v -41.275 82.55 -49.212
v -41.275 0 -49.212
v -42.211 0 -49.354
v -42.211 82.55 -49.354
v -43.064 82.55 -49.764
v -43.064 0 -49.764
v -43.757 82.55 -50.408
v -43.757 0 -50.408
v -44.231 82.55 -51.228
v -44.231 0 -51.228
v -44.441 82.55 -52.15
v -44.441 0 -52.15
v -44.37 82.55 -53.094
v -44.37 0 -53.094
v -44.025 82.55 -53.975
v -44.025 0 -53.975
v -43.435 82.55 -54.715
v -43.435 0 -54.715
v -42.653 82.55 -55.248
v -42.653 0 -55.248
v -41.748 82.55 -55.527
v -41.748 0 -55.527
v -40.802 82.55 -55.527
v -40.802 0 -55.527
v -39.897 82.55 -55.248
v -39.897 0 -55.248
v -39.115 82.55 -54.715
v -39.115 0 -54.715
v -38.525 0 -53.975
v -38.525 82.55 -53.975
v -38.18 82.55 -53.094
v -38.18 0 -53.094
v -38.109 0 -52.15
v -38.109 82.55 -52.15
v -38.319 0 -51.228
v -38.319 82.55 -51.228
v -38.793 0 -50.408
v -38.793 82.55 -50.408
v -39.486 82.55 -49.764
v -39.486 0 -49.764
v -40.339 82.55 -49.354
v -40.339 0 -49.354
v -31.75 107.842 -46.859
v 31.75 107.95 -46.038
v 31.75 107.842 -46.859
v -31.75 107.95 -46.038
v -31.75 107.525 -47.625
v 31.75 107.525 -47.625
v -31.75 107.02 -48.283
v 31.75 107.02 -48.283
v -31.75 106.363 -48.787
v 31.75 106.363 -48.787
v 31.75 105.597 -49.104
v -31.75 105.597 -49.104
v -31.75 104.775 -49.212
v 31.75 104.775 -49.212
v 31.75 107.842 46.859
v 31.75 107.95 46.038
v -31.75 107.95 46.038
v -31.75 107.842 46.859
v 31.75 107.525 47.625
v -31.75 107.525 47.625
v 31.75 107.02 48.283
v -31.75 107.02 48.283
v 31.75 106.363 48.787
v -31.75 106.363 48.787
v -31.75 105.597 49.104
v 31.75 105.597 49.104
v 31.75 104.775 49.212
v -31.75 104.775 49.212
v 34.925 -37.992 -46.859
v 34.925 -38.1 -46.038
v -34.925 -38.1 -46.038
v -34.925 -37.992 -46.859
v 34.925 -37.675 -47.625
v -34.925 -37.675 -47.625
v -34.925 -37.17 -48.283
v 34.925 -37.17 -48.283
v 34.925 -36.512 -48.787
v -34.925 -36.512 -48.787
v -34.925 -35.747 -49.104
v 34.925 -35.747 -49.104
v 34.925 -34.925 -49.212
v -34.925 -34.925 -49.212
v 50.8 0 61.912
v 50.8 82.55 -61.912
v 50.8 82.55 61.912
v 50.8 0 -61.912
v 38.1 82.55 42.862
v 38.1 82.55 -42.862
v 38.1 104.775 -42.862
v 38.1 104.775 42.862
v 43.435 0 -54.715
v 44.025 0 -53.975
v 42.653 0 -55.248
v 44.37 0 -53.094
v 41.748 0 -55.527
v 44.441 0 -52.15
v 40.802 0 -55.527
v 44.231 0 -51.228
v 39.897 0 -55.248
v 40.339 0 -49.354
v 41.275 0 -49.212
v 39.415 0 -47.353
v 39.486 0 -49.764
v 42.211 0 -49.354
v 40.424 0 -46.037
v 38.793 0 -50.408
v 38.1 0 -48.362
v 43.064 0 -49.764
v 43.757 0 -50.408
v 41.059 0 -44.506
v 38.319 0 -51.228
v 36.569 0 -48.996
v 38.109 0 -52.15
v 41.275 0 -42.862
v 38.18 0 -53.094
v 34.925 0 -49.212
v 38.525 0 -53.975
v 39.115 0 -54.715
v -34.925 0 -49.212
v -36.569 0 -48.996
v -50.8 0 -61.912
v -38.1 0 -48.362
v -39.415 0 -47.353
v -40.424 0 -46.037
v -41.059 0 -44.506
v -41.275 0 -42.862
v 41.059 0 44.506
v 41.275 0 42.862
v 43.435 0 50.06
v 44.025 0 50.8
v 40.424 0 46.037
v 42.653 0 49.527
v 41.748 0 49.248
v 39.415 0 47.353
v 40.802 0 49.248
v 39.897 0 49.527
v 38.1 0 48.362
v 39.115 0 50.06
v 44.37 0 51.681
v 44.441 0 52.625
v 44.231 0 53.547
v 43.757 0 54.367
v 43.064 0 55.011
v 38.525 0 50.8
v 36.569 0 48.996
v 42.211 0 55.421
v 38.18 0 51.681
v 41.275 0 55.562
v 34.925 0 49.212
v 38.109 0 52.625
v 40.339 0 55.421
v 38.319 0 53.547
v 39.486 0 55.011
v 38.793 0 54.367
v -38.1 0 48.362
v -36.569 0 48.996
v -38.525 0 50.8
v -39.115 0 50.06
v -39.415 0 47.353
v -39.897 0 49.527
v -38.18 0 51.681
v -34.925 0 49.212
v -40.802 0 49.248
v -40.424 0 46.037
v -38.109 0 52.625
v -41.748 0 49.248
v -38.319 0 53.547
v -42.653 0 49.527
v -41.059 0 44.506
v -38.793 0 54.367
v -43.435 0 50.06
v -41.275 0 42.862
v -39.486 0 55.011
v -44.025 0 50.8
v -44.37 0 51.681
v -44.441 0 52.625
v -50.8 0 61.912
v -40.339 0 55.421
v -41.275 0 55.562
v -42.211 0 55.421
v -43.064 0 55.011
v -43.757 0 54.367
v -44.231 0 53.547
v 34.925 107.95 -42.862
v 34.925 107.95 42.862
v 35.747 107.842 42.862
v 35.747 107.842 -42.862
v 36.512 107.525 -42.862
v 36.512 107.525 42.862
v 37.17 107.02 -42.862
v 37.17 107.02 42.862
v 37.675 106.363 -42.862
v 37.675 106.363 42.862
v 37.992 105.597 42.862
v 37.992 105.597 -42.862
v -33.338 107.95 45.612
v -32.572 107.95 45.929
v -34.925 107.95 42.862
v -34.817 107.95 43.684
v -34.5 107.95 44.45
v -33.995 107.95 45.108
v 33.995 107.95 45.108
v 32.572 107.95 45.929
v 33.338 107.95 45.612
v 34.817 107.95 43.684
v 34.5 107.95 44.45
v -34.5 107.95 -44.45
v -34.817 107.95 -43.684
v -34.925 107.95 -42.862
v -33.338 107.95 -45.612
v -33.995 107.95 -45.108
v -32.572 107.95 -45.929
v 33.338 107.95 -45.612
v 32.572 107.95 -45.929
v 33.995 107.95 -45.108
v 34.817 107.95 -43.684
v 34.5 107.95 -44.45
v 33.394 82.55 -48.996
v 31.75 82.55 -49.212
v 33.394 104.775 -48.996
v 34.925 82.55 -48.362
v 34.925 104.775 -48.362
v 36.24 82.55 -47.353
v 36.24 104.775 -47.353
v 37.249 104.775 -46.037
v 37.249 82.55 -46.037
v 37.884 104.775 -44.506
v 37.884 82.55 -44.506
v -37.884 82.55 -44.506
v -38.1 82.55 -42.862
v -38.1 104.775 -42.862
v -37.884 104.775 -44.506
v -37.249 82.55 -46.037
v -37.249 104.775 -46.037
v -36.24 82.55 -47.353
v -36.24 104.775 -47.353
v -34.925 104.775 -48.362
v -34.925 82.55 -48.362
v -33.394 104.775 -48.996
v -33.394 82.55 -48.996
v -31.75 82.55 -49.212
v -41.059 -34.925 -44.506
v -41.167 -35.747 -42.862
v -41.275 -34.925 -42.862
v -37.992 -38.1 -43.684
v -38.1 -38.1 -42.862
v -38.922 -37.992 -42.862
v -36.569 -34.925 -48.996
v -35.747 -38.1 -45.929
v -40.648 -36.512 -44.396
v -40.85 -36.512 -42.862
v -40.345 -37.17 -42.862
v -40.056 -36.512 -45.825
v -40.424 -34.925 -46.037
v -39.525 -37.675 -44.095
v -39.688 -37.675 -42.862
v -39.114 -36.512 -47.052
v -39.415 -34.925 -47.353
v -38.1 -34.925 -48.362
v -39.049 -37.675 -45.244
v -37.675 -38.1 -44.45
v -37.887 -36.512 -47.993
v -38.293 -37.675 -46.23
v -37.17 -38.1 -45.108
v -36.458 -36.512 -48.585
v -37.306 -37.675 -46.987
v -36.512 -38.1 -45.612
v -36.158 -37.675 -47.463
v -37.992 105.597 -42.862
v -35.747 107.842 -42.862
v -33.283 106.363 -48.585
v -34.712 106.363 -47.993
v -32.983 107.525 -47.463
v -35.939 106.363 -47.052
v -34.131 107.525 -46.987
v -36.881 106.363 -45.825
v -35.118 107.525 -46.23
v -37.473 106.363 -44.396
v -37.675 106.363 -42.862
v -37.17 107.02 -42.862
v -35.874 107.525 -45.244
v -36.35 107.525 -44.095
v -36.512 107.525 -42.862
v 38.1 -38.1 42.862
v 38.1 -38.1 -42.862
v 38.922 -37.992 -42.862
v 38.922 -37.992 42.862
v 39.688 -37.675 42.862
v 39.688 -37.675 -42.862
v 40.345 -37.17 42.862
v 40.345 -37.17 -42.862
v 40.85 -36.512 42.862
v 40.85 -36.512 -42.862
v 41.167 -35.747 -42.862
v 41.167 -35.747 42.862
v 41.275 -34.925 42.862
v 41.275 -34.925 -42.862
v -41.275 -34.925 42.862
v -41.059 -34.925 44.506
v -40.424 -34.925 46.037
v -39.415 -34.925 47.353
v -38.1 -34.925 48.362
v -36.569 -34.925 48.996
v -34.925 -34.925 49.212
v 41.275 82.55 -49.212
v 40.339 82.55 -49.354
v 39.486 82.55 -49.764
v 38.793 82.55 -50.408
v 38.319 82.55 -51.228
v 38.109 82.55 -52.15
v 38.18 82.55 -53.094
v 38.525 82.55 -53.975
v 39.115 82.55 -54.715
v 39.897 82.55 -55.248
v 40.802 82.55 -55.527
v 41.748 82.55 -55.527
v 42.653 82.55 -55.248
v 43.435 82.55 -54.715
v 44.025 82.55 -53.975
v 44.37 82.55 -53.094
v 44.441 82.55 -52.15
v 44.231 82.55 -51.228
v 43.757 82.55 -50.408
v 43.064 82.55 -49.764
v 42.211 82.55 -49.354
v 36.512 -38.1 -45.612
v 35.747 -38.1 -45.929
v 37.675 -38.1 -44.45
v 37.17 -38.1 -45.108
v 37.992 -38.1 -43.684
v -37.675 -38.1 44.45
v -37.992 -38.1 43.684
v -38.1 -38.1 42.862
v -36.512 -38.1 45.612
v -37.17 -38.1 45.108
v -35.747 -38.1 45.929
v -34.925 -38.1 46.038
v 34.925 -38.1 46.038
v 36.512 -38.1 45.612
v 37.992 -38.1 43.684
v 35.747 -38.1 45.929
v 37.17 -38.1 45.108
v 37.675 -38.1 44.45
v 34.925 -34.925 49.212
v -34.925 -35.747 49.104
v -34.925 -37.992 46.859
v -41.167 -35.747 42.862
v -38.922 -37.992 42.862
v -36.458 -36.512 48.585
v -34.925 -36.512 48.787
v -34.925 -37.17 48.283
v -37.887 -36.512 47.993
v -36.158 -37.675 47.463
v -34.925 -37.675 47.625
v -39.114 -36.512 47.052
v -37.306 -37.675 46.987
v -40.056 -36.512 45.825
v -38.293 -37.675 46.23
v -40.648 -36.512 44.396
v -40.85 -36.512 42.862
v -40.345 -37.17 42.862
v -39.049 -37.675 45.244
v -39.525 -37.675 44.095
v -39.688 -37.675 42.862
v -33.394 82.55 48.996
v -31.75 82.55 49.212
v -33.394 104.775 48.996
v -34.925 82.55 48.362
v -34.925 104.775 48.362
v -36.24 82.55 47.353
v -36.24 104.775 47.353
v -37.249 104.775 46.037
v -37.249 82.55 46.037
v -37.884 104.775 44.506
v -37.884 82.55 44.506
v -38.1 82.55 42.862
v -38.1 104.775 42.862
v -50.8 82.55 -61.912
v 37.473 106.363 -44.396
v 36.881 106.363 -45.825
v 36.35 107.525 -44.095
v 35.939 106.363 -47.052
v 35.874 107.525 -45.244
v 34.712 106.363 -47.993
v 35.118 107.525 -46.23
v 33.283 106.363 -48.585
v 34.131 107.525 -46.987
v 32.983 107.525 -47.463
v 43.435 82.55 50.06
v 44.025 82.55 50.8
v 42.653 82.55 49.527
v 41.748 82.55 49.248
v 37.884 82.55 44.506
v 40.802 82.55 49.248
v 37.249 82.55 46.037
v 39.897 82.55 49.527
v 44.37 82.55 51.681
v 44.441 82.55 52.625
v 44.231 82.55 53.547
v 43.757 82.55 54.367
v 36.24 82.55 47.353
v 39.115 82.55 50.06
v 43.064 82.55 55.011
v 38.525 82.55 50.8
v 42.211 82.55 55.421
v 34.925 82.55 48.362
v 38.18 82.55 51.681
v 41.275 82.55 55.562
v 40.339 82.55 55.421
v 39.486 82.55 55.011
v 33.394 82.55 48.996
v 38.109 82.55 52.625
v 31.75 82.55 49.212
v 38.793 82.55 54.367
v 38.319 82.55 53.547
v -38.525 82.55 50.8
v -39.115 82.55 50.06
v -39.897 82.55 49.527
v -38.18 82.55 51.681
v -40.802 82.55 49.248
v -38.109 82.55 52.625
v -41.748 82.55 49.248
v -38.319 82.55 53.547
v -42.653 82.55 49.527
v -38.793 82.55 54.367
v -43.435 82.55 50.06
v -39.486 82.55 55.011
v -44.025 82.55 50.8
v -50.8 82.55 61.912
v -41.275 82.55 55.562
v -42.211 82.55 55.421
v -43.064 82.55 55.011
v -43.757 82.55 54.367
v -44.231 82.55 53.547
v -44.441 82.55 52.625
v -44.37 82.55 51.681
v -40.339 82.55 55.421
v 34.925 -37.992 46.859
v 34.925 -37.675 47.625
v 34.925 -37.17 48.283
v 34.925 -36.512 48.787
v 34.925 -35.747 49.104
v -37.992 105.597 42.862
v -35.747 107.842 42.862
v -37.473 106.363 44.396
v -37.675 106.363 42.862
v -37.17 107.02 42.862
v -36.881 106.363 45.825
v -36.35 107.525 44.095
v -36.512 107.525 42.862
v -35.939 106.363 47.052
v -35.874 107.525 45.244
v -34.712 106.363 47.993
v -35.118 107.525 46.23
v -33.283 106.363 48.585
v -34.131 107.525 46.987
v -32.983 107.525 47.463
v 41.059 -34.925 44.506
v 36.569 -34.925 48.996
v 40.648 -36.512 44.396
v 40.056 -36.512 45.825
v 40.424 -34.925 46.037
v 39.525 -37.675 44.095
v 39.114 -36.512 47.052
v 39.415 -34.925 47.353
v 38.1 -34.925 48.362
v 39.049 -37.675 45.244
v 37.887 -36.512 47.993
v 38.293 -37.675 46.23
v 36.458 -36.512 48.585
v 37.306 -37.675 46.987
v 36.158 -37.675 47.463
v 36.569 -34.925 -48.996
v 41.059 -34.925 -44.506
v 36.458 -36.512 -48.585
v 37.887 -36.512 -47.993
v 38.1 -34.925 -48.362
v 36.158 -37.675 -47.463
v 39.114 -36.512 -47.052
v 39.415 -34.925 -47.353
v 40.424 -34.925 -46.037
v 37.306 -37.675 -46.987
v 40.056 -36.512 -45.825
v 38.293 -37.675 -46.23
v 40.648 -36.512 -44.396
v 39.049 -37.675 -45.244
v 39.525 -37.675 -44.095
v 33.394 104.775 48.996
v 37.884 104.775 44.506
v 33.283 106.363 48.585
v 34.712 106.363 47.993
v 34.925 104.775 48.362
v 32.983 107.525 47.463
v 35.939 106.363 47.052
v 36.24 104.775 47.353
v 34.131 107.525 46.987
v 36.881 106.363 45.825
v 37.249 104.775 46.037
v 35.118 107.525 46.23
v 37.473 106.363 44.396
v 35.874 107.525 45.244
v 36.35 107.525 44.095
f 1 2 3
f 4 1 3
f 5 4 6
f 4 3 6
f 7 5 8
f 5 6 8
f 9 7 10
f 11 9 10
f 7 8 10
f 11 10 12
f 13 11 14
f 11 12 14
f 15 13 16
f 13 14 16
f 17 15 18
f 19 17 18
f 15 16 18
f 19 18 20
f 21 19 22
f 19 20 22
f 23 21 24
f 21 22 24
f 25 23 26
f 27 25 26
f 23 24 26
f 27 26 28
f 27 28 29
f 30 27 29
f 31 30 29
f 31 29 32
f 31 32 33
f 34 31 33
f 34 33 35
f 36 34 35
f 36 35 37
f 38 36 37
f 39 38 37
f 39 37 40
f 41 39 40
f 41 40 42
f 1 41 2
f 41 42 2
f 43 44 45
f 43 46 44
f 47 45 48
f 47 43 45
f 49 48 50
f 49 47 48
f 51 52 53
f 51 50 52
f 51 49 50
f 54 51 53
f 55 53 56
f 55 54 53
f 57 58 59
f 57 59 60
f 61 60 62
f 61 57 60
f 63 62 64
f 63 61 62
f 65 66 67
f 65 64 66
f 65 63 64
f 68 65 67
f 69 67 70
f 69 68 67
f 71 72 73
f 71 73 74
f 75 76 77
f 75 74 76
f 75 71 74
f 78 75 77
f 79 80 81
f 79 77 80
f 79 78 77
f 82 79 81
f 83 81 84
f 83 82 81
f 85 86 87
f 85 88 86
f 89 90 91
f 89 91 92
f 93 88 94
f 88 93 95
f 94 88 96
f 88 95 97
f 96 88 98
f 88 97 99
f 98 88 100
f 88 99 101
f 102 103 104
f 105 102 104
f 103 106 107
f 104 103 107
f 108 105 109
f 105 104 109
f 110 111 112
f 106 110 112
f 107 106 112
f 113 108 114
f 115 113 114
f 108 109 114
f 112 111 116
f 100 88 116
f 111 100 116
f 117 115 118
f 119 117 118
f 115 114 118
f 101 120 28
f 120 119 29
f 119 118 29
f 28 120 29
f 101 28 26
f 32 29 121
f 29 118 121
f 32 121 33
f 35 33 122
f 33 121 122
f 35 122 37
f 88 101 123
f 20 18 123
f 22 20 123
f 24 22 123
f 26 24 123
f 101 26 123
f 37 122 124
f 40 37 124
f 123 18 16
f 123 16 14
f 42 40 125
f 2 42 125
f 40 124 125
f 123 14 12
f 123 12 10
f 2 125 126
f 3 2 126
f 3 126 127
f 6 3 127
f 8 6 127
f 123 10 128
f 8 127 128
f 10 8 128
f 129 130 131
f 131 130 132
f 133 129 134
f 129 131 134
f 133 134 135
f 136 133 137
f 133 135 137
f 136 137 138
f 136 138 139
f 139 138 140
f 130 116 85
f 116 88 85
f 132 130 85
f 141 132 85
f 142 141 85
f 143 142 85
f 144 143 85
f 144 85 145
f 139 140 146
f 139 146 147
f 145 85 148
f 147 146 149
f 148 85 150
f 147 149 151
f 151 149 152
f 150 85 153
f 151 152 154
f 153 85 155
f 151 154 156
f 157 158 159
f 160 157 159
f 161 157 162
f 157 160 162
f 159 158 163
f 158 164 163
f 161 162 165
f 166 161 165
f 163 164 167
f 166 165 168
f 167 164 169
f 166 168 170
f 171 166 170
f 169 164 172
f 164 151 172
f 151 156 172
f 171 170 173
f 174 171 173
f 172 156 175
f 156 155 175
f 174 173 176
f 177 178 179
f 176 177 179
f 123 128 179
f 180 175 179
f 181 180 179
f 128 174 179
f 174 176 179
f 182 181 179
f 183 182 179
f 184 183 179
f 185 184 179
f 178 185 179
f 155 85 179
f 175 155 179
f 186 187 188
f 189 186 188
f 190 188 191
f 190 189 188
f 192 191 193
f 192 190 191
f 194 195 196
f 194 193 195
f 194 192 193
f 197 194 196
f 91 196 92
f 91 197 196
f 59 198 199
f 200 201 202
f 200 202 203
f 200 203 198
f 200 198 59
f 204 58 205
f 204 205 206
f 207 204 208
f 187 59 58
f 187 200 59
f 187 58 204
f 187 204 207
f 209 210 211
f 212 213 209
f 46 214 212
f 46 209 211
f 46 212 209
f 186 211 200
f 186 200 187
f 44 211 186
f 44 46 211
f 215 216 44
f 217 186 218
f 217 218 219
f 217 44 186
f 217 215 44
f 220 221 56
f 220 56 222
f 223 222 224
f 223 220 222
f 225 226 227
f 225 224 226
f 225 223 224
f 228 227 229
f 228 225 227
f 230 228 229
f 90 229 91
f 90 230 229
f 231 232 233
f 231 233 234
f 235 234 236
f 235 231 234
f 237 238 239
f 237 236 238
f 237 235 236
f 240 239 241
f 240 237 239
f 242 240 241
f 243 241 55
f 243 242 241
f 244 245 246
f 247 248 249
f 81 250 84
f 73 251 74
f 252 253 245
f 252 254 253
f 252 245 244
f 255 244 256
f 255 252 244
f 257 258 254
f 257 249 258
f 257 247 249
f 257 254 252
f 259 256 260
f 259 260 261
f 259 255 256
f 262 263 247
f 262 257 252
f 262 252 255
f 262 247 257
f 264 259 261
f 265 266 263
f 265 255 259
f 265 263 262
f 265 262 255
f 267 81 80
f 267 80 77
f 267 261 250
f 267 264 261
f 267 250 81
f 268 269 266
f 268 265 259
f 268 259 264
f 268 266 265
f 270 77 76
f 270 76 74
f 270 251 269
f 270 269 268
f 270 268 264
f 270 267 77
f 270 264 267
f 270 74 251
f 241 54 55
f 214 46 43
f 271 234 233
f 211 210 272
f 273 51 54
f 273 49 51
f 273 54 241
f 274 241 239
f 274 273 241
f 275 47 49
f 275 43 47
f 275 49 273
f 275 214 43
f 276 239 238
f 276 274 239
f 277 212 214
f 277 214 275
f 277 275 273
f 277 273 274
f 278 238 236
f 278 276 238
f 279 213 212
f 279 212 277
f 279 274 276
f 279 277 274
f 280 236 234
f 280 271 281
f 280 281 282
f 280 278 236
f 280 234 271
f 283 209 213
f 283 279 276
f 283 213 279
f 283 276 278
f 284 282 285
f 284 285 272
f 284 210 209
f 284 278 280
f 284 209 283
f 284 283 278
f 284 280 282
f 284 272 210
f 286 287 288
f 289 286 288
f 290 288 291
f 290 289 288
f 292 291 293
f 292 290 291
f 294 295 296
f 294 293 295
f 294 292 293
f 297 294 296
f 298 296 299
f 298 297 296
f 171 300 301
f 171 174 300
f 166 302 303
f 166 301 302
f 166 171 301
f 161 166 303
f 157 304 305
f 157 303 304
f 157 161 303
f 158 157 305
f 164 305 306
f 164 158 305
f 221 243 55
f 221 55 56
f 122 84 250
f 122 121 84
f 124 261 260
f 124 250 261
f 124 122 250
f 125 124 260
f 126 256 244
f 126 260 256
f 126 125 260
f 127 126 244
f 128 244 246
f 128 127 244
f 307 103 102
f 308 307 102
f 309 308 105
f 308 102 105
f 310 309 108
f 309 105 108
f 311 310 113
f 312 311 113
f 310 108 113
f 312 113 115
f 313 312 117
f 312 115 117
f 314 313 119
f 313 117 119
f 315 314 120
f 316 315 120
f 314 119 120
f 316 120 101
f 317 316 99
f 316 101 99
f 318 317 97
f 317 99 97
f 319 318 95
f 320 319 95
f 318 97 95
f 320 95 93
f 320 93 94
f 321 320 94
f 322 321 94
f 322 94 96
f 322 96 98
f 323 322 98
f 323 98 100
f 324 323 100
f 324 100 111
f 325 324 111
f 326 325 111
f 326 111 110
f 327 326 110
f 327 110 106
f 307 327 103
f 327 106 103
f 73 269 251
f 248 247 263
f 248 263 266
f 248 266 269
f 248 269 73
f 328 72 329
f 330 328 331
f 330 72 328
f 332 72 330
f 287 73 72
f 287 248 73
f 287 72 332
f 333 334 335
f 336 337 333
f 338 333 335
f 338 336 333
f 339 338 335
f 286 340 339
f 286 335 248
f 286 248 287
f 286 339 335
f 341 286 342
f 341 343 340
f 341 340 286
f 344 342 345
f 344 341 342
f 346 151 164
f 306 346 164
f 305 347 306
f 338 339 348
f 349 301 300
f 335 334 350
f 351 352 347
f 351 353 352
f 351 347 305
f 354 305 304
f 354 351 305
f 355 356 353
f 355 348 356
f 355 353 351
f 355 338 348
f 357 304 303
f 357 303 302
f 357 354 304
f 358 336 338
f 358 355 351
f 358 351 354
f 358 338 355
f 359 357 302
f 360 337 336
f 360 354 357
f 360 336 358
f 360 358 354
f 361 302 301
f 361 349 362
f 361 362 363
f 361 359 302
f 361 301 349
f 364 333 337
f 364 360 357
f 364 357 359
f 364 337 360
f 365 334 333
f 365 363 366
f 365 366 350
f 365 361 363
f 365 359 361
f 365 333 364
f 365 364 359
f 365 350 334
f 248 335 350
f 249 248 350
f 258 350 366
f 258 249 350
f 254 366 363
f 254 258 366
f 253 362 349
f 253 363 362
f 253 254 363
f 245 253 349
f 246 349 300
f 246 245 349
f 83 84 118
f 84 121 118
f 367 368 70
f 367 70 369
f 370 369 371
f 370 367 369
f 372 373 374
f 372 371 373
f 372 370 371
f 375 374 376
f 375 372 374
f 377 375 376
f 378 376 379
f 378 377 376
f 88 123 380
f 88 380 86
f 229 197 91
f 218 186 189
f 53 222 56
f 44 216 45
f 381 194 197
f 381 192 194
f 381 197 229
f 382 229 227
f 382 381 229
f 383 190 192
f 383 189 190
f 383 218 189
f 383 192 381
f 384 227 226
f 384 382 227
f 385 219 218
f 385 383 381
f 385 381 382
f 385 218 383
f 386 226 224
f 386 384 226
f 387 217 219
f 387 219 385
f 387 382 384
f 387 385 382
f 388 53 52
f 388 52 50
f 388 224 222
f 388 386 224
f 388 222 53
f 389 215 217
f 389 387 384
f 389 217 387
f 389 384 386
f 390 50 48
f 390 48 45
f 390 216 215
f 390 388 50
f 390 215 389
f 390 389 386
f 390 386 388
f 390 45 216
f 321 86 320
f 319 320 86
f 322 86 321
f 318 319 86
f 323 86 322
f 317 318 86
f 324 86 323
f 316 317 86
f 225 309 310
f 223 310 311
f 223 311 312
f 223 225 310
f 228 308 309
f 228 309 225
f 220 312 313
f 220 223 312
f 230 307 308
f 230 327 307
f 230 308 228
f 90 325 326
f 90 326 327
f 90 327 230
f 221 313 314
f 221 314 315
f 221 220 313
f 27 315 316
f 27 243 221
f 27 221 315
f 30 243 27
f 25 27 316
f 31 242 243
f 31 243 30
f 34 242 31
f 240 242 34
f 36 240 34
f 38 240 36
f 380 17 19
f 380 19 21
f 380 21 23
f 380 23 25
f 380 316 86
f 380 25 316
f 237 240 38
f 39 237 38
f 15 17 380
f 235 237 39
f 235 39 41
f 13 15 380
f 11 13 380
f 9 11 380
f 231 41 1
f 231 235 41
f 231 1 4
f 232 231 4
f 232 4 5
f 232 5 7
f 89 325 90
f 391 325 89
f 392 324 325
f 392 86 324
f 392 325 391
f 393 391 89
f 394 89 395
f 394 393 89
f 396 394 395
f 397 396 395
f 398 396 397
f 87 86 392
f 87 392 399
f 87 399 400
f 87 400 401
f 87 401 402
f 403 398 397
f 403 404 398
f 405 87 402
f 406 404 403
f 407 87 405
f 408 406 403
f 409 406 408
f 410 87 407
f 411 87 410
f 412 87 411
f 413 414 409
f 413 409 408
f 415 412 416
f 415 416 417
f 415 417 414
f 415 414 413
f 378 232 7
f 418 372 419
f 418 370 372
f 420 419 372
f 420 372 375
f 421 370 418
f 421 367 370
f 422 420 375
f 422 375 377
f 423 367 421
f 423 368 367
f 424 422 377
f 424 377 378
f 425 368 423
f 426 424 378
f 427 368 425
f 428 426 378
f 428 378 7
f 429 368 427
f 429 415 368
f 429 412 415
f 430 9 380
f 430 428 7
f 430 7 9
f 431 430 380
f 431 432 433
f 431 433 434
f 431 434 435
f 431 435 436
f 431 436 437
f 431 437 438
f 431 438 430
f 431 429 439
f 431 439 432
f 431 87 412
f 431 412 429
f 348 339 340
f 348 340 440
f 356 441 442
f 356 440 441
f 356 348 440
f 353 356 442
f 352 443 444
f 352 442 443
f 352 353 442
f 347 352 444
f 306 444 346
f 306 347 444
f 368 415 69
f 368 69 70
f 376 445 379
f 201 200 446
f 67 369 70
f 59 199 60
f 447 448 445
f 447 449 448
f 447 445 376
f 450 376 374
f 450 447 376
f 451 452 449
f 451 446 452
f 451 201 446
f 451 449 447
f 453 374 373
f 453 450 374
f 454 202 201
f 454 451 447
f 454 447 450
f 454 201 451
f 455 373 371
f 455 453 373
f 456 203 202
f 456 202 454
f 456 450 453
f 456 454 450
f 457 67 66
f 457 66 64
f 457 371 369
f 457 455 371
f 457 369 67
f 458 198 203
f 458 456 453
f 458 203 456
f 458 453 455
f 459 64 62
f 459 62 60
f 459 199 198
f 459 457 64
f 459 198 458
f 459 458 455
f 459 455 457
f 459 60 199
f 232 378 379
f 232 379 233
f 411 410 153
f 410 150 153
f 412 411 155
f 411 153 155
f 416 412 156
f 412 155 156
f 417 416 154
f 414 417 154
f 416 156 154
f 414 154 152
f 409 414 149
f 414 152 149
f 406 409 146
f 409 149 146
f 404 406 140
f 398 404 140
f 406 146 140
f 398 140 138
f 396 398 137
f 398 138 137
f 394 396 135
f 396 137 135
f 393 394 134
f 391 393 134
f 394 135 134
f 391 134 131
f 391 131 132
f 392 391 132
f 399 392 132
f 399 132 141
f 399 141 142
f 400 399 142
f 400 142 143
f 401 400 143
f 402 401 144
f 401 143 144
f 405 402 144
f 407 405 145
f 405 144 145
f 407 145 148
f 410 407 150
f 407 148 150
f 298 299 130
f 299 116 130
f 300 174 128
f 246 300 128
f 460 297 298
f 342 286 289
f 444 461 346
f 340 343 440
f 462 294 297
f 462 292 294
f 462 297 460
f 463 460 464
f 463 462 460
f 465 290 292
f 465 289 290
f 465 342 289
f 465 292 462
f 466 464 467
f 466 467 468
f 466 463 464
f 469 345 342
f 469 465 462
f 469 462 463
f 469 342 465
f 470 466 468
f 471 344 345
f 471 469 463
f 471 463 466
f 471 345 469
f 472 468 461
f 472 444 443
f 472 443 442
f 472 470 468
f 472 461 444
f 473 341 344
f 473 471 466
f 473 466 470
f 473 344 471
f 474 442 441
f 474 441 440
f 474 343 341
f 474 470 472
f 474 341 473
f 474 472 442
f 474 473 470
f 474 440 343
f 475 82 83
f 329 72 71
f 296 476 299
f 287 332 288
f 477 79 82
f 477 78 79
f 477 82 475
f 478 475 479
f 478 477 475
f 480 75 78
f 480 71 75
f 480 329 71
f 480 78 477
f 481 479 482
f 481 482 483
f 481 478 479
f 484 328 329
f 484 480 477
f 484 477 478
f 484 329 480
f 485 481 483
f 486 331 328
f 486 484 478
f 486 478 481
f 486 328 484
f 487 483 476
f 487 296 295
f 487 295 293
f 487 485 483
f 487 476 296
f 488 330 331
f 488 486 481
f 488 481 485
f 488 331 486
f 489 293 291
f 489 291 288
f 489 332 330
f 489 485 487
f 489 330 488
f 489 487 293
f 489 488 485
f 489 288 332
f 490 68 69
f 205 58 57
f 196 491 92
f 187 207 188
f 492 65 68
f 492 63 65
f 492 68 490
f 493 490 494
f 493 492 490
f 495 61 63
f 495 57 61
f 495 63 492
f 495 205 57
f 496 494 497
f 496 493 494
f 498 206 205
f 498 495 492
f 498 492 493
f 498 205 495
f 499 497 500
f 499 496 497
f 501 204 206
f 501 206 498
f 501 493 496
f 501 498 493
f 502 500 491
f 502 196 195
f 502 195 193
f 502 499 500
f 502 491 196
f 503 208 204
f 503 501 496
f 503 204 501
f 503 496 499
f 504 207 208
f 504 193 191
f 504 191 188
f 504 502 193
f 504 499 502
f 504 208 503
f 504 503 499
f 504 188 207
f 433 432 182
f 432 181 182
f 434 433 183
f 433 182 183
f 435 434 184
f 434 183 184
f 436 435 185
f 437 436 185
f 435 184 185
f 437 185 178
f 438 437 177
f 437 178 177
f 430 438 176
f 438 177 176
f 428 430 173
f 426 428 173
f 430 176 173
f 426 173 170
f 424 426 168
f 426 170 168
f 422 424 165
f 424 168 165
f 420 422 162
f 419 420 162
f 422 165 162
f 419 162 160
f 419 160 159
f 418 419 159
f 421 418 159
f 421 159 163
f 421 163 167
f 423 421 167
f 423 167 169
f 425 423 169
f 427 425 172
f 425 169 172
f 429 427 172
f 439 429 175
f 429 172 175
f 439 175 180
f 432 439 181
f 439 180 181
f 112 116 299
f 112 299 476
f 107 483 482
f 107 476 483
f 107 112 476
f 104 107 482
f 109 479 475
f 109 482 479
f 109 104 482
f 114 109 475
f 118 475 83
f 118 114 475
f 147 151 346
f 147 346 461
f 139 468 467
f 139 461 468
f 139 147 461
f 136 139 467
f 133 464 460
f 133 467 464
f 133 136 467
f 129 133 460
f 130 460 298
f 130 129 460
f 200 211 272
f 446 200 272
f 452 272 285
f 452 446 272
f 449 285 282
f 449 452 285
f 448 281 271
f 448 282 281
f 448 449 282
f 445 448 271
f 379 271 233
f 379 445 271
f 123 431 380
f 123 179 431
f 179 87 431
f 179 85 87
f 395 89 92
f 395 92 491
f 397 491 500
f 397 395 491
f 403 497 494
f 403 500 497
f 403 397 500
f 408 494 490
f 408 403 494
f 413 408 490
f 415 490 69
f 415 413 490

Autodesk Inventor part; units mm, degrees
ref_plane "YZ Plane" through (0, 0, 0) normal (1, 0, 0) x (0, 1, 0)
ref_plane "XZ Plane" through (0, 0, 0) normal (0, 1, 0) x (-1, 0, 0)
ref_plane "XY Plane" through (0, 0, 0) normal (0, 0, 1) x (1, 0, 0)
sketch "Sketch1" plane through (0, 0, 0) normal (0, 1, 0) x (-1, 0, 0)
  line L0 (-50.8, 61.9125) -> (50.8, 61.9125)
  line L1 (50.8, 61.9125) -> (50.8, -61.9125)
  line L2 (50.8, -61.9125) -> (-50.8, -61.9125)
  line L3 (-50.8, -61.9125) -> (-50.8, 61.9125)
  line L4 (-50.8, 61.9125) -> (50.8, -61.9125) construction
  line L5 (50.8, 61.9125) -> (-50.8, -61.9125) construction
  point P0 (0, 0)
  dimension "d0" = 123.825
  dimension "d1" = 101.6
extrude "Extrusion1" add sketch "Sketch1" along normal blind 82.55
sketch "Sketch2" plane through (0, 82.55, 0) normal (0, 1, 0) x (1, 0, 0)
  line L0 (31.75, -49.2125) -> (-31.75, -49.2125)
  line L1 (-38.1, -42.8625) -> (-38.1, 42.8625)
  line L2 (-31.75, 49.2125) -> (31.75, 49.2125)
  line L3 (38.1, 42.8625) -> (38.1, -42.8625)
  line L4 (38.1, -49.2125) -> (-38.1, 49.2125) construction
  line L5 (-38.1, -49.2125) -> (38.1, 49.2125) construction
  arc A0 (-38.1, -42.8625) -> (-31.75, -49.2125) centre (-31.75, -42.8625) ccw
  arc A1 (-31.75, 49.2125) -> (-38.1, 42.8625) centre (-31.75, 42.8625) ccw
  arc A2 (38.1, 42.8625) -> (31.75, 49.2125) centre (31.75, 42.8625) ccw
  arc A3 (31.75, -49.2125) -> (38.1, -42.8625) centre (31.75, -42.8625) ccw
  line L6 (-50.8, 61.9125) -> (-50.8, -61.9125) projected
  line L7 (50.8, 61.9125) -> (-50.8, 61.9125) projected
  point P0 (0, 0)
  dimension "d6" = 6.35
  dimension "d25" = 12.7
  dimension "d26" = 12.7
extrude "Extrusion2" add sketch "Sketch2" along normal blind 25.4
fillet "Fillet1" radius 3.175 8 edges at (36.2401, 107.95, 47.3526) (38.1, 107.95, 0) (36.2401, 107.95, -47.3526) (0, 107.95, -49.2125) (-36.2401, 107.95, -47.3526) (-38.1, 107.95, 0) (-36.2401, 107.95, 47.3526) (0, 107.95, 49.2125)
hole "Hole1" at (41.275, 82.55, 52.3875) direction (0, -1, 0) diameter 6.35 end through all
pattern_linear "Rectangular Pattern1" count 2 spacing 104.775 along (0, 0, -1) count 2 spacing 82.55 along (-1, 0, 0) of "Hole1"
sketch "Sketch3" plane through (0, 0, 0) normal (0, -1, 0) x (1, 0, 0)
  line L0 (-34.925, -49.2125) -> (34.925, -49.2125)
  line L1 (41.275, -42.8625) -> (41.275, 42.8625)
  line L2 (34.925, 49.2125) -> (-34.925, 49.2125)
  line L3 (-41.275, 42.8625) -> (-41.275, -42.8625)
  line L4 (-41.275, -49.2125) -> (41.275, 49.2125) construction
  line L5 (41.275, -49.2125) -> (-41.275, 49.2125) construction
  line L6 (50.8, 61.9125) -> (-50.8, 61.9125) projected
  line L7 (50.8, -61.9125) -> (50.8, 61.9125) projected
  arc A0 (-34.925, 49.2125) -> (-41.275, 42.8625) centre (-34.925, 42.8625) ccw
  arc A1 (41.275, 42.8625) -> (34.925, 49.2125) centre (34.925, 42.8625) ccw
  arc A2 (34.925, -49.2125) -> (41.275, -42.8625) centre (34.925, -42.8625) ccw
  arc A3 (-41.275, -42.8625) -> (-34.925, -49.2125) centre (-34.925, -42.8625) ccw
  point P0 (0, 0)
  dimension "d27" = 12.7
  dimension "d28" = 9.525
  dimension "d29" = 6.35
extrude "Extrusion3" add sketch "Sketch3" along normal blind 38.1
fillet "Fillet2" radius 3.175 8 edges at (-39.4151, -38.1, 47.3526) (-41.275, -38.1, 0) (-39.4151, -38.1, -47.3526) (0, -38.1, -49.2125) (39.4151, -38.1, -47.3526) (41.275, -38.1, 0) (39.4151, -38.1, 47.3526) (0, -38.1, 49.2125)
properties part number "xmfr power"
